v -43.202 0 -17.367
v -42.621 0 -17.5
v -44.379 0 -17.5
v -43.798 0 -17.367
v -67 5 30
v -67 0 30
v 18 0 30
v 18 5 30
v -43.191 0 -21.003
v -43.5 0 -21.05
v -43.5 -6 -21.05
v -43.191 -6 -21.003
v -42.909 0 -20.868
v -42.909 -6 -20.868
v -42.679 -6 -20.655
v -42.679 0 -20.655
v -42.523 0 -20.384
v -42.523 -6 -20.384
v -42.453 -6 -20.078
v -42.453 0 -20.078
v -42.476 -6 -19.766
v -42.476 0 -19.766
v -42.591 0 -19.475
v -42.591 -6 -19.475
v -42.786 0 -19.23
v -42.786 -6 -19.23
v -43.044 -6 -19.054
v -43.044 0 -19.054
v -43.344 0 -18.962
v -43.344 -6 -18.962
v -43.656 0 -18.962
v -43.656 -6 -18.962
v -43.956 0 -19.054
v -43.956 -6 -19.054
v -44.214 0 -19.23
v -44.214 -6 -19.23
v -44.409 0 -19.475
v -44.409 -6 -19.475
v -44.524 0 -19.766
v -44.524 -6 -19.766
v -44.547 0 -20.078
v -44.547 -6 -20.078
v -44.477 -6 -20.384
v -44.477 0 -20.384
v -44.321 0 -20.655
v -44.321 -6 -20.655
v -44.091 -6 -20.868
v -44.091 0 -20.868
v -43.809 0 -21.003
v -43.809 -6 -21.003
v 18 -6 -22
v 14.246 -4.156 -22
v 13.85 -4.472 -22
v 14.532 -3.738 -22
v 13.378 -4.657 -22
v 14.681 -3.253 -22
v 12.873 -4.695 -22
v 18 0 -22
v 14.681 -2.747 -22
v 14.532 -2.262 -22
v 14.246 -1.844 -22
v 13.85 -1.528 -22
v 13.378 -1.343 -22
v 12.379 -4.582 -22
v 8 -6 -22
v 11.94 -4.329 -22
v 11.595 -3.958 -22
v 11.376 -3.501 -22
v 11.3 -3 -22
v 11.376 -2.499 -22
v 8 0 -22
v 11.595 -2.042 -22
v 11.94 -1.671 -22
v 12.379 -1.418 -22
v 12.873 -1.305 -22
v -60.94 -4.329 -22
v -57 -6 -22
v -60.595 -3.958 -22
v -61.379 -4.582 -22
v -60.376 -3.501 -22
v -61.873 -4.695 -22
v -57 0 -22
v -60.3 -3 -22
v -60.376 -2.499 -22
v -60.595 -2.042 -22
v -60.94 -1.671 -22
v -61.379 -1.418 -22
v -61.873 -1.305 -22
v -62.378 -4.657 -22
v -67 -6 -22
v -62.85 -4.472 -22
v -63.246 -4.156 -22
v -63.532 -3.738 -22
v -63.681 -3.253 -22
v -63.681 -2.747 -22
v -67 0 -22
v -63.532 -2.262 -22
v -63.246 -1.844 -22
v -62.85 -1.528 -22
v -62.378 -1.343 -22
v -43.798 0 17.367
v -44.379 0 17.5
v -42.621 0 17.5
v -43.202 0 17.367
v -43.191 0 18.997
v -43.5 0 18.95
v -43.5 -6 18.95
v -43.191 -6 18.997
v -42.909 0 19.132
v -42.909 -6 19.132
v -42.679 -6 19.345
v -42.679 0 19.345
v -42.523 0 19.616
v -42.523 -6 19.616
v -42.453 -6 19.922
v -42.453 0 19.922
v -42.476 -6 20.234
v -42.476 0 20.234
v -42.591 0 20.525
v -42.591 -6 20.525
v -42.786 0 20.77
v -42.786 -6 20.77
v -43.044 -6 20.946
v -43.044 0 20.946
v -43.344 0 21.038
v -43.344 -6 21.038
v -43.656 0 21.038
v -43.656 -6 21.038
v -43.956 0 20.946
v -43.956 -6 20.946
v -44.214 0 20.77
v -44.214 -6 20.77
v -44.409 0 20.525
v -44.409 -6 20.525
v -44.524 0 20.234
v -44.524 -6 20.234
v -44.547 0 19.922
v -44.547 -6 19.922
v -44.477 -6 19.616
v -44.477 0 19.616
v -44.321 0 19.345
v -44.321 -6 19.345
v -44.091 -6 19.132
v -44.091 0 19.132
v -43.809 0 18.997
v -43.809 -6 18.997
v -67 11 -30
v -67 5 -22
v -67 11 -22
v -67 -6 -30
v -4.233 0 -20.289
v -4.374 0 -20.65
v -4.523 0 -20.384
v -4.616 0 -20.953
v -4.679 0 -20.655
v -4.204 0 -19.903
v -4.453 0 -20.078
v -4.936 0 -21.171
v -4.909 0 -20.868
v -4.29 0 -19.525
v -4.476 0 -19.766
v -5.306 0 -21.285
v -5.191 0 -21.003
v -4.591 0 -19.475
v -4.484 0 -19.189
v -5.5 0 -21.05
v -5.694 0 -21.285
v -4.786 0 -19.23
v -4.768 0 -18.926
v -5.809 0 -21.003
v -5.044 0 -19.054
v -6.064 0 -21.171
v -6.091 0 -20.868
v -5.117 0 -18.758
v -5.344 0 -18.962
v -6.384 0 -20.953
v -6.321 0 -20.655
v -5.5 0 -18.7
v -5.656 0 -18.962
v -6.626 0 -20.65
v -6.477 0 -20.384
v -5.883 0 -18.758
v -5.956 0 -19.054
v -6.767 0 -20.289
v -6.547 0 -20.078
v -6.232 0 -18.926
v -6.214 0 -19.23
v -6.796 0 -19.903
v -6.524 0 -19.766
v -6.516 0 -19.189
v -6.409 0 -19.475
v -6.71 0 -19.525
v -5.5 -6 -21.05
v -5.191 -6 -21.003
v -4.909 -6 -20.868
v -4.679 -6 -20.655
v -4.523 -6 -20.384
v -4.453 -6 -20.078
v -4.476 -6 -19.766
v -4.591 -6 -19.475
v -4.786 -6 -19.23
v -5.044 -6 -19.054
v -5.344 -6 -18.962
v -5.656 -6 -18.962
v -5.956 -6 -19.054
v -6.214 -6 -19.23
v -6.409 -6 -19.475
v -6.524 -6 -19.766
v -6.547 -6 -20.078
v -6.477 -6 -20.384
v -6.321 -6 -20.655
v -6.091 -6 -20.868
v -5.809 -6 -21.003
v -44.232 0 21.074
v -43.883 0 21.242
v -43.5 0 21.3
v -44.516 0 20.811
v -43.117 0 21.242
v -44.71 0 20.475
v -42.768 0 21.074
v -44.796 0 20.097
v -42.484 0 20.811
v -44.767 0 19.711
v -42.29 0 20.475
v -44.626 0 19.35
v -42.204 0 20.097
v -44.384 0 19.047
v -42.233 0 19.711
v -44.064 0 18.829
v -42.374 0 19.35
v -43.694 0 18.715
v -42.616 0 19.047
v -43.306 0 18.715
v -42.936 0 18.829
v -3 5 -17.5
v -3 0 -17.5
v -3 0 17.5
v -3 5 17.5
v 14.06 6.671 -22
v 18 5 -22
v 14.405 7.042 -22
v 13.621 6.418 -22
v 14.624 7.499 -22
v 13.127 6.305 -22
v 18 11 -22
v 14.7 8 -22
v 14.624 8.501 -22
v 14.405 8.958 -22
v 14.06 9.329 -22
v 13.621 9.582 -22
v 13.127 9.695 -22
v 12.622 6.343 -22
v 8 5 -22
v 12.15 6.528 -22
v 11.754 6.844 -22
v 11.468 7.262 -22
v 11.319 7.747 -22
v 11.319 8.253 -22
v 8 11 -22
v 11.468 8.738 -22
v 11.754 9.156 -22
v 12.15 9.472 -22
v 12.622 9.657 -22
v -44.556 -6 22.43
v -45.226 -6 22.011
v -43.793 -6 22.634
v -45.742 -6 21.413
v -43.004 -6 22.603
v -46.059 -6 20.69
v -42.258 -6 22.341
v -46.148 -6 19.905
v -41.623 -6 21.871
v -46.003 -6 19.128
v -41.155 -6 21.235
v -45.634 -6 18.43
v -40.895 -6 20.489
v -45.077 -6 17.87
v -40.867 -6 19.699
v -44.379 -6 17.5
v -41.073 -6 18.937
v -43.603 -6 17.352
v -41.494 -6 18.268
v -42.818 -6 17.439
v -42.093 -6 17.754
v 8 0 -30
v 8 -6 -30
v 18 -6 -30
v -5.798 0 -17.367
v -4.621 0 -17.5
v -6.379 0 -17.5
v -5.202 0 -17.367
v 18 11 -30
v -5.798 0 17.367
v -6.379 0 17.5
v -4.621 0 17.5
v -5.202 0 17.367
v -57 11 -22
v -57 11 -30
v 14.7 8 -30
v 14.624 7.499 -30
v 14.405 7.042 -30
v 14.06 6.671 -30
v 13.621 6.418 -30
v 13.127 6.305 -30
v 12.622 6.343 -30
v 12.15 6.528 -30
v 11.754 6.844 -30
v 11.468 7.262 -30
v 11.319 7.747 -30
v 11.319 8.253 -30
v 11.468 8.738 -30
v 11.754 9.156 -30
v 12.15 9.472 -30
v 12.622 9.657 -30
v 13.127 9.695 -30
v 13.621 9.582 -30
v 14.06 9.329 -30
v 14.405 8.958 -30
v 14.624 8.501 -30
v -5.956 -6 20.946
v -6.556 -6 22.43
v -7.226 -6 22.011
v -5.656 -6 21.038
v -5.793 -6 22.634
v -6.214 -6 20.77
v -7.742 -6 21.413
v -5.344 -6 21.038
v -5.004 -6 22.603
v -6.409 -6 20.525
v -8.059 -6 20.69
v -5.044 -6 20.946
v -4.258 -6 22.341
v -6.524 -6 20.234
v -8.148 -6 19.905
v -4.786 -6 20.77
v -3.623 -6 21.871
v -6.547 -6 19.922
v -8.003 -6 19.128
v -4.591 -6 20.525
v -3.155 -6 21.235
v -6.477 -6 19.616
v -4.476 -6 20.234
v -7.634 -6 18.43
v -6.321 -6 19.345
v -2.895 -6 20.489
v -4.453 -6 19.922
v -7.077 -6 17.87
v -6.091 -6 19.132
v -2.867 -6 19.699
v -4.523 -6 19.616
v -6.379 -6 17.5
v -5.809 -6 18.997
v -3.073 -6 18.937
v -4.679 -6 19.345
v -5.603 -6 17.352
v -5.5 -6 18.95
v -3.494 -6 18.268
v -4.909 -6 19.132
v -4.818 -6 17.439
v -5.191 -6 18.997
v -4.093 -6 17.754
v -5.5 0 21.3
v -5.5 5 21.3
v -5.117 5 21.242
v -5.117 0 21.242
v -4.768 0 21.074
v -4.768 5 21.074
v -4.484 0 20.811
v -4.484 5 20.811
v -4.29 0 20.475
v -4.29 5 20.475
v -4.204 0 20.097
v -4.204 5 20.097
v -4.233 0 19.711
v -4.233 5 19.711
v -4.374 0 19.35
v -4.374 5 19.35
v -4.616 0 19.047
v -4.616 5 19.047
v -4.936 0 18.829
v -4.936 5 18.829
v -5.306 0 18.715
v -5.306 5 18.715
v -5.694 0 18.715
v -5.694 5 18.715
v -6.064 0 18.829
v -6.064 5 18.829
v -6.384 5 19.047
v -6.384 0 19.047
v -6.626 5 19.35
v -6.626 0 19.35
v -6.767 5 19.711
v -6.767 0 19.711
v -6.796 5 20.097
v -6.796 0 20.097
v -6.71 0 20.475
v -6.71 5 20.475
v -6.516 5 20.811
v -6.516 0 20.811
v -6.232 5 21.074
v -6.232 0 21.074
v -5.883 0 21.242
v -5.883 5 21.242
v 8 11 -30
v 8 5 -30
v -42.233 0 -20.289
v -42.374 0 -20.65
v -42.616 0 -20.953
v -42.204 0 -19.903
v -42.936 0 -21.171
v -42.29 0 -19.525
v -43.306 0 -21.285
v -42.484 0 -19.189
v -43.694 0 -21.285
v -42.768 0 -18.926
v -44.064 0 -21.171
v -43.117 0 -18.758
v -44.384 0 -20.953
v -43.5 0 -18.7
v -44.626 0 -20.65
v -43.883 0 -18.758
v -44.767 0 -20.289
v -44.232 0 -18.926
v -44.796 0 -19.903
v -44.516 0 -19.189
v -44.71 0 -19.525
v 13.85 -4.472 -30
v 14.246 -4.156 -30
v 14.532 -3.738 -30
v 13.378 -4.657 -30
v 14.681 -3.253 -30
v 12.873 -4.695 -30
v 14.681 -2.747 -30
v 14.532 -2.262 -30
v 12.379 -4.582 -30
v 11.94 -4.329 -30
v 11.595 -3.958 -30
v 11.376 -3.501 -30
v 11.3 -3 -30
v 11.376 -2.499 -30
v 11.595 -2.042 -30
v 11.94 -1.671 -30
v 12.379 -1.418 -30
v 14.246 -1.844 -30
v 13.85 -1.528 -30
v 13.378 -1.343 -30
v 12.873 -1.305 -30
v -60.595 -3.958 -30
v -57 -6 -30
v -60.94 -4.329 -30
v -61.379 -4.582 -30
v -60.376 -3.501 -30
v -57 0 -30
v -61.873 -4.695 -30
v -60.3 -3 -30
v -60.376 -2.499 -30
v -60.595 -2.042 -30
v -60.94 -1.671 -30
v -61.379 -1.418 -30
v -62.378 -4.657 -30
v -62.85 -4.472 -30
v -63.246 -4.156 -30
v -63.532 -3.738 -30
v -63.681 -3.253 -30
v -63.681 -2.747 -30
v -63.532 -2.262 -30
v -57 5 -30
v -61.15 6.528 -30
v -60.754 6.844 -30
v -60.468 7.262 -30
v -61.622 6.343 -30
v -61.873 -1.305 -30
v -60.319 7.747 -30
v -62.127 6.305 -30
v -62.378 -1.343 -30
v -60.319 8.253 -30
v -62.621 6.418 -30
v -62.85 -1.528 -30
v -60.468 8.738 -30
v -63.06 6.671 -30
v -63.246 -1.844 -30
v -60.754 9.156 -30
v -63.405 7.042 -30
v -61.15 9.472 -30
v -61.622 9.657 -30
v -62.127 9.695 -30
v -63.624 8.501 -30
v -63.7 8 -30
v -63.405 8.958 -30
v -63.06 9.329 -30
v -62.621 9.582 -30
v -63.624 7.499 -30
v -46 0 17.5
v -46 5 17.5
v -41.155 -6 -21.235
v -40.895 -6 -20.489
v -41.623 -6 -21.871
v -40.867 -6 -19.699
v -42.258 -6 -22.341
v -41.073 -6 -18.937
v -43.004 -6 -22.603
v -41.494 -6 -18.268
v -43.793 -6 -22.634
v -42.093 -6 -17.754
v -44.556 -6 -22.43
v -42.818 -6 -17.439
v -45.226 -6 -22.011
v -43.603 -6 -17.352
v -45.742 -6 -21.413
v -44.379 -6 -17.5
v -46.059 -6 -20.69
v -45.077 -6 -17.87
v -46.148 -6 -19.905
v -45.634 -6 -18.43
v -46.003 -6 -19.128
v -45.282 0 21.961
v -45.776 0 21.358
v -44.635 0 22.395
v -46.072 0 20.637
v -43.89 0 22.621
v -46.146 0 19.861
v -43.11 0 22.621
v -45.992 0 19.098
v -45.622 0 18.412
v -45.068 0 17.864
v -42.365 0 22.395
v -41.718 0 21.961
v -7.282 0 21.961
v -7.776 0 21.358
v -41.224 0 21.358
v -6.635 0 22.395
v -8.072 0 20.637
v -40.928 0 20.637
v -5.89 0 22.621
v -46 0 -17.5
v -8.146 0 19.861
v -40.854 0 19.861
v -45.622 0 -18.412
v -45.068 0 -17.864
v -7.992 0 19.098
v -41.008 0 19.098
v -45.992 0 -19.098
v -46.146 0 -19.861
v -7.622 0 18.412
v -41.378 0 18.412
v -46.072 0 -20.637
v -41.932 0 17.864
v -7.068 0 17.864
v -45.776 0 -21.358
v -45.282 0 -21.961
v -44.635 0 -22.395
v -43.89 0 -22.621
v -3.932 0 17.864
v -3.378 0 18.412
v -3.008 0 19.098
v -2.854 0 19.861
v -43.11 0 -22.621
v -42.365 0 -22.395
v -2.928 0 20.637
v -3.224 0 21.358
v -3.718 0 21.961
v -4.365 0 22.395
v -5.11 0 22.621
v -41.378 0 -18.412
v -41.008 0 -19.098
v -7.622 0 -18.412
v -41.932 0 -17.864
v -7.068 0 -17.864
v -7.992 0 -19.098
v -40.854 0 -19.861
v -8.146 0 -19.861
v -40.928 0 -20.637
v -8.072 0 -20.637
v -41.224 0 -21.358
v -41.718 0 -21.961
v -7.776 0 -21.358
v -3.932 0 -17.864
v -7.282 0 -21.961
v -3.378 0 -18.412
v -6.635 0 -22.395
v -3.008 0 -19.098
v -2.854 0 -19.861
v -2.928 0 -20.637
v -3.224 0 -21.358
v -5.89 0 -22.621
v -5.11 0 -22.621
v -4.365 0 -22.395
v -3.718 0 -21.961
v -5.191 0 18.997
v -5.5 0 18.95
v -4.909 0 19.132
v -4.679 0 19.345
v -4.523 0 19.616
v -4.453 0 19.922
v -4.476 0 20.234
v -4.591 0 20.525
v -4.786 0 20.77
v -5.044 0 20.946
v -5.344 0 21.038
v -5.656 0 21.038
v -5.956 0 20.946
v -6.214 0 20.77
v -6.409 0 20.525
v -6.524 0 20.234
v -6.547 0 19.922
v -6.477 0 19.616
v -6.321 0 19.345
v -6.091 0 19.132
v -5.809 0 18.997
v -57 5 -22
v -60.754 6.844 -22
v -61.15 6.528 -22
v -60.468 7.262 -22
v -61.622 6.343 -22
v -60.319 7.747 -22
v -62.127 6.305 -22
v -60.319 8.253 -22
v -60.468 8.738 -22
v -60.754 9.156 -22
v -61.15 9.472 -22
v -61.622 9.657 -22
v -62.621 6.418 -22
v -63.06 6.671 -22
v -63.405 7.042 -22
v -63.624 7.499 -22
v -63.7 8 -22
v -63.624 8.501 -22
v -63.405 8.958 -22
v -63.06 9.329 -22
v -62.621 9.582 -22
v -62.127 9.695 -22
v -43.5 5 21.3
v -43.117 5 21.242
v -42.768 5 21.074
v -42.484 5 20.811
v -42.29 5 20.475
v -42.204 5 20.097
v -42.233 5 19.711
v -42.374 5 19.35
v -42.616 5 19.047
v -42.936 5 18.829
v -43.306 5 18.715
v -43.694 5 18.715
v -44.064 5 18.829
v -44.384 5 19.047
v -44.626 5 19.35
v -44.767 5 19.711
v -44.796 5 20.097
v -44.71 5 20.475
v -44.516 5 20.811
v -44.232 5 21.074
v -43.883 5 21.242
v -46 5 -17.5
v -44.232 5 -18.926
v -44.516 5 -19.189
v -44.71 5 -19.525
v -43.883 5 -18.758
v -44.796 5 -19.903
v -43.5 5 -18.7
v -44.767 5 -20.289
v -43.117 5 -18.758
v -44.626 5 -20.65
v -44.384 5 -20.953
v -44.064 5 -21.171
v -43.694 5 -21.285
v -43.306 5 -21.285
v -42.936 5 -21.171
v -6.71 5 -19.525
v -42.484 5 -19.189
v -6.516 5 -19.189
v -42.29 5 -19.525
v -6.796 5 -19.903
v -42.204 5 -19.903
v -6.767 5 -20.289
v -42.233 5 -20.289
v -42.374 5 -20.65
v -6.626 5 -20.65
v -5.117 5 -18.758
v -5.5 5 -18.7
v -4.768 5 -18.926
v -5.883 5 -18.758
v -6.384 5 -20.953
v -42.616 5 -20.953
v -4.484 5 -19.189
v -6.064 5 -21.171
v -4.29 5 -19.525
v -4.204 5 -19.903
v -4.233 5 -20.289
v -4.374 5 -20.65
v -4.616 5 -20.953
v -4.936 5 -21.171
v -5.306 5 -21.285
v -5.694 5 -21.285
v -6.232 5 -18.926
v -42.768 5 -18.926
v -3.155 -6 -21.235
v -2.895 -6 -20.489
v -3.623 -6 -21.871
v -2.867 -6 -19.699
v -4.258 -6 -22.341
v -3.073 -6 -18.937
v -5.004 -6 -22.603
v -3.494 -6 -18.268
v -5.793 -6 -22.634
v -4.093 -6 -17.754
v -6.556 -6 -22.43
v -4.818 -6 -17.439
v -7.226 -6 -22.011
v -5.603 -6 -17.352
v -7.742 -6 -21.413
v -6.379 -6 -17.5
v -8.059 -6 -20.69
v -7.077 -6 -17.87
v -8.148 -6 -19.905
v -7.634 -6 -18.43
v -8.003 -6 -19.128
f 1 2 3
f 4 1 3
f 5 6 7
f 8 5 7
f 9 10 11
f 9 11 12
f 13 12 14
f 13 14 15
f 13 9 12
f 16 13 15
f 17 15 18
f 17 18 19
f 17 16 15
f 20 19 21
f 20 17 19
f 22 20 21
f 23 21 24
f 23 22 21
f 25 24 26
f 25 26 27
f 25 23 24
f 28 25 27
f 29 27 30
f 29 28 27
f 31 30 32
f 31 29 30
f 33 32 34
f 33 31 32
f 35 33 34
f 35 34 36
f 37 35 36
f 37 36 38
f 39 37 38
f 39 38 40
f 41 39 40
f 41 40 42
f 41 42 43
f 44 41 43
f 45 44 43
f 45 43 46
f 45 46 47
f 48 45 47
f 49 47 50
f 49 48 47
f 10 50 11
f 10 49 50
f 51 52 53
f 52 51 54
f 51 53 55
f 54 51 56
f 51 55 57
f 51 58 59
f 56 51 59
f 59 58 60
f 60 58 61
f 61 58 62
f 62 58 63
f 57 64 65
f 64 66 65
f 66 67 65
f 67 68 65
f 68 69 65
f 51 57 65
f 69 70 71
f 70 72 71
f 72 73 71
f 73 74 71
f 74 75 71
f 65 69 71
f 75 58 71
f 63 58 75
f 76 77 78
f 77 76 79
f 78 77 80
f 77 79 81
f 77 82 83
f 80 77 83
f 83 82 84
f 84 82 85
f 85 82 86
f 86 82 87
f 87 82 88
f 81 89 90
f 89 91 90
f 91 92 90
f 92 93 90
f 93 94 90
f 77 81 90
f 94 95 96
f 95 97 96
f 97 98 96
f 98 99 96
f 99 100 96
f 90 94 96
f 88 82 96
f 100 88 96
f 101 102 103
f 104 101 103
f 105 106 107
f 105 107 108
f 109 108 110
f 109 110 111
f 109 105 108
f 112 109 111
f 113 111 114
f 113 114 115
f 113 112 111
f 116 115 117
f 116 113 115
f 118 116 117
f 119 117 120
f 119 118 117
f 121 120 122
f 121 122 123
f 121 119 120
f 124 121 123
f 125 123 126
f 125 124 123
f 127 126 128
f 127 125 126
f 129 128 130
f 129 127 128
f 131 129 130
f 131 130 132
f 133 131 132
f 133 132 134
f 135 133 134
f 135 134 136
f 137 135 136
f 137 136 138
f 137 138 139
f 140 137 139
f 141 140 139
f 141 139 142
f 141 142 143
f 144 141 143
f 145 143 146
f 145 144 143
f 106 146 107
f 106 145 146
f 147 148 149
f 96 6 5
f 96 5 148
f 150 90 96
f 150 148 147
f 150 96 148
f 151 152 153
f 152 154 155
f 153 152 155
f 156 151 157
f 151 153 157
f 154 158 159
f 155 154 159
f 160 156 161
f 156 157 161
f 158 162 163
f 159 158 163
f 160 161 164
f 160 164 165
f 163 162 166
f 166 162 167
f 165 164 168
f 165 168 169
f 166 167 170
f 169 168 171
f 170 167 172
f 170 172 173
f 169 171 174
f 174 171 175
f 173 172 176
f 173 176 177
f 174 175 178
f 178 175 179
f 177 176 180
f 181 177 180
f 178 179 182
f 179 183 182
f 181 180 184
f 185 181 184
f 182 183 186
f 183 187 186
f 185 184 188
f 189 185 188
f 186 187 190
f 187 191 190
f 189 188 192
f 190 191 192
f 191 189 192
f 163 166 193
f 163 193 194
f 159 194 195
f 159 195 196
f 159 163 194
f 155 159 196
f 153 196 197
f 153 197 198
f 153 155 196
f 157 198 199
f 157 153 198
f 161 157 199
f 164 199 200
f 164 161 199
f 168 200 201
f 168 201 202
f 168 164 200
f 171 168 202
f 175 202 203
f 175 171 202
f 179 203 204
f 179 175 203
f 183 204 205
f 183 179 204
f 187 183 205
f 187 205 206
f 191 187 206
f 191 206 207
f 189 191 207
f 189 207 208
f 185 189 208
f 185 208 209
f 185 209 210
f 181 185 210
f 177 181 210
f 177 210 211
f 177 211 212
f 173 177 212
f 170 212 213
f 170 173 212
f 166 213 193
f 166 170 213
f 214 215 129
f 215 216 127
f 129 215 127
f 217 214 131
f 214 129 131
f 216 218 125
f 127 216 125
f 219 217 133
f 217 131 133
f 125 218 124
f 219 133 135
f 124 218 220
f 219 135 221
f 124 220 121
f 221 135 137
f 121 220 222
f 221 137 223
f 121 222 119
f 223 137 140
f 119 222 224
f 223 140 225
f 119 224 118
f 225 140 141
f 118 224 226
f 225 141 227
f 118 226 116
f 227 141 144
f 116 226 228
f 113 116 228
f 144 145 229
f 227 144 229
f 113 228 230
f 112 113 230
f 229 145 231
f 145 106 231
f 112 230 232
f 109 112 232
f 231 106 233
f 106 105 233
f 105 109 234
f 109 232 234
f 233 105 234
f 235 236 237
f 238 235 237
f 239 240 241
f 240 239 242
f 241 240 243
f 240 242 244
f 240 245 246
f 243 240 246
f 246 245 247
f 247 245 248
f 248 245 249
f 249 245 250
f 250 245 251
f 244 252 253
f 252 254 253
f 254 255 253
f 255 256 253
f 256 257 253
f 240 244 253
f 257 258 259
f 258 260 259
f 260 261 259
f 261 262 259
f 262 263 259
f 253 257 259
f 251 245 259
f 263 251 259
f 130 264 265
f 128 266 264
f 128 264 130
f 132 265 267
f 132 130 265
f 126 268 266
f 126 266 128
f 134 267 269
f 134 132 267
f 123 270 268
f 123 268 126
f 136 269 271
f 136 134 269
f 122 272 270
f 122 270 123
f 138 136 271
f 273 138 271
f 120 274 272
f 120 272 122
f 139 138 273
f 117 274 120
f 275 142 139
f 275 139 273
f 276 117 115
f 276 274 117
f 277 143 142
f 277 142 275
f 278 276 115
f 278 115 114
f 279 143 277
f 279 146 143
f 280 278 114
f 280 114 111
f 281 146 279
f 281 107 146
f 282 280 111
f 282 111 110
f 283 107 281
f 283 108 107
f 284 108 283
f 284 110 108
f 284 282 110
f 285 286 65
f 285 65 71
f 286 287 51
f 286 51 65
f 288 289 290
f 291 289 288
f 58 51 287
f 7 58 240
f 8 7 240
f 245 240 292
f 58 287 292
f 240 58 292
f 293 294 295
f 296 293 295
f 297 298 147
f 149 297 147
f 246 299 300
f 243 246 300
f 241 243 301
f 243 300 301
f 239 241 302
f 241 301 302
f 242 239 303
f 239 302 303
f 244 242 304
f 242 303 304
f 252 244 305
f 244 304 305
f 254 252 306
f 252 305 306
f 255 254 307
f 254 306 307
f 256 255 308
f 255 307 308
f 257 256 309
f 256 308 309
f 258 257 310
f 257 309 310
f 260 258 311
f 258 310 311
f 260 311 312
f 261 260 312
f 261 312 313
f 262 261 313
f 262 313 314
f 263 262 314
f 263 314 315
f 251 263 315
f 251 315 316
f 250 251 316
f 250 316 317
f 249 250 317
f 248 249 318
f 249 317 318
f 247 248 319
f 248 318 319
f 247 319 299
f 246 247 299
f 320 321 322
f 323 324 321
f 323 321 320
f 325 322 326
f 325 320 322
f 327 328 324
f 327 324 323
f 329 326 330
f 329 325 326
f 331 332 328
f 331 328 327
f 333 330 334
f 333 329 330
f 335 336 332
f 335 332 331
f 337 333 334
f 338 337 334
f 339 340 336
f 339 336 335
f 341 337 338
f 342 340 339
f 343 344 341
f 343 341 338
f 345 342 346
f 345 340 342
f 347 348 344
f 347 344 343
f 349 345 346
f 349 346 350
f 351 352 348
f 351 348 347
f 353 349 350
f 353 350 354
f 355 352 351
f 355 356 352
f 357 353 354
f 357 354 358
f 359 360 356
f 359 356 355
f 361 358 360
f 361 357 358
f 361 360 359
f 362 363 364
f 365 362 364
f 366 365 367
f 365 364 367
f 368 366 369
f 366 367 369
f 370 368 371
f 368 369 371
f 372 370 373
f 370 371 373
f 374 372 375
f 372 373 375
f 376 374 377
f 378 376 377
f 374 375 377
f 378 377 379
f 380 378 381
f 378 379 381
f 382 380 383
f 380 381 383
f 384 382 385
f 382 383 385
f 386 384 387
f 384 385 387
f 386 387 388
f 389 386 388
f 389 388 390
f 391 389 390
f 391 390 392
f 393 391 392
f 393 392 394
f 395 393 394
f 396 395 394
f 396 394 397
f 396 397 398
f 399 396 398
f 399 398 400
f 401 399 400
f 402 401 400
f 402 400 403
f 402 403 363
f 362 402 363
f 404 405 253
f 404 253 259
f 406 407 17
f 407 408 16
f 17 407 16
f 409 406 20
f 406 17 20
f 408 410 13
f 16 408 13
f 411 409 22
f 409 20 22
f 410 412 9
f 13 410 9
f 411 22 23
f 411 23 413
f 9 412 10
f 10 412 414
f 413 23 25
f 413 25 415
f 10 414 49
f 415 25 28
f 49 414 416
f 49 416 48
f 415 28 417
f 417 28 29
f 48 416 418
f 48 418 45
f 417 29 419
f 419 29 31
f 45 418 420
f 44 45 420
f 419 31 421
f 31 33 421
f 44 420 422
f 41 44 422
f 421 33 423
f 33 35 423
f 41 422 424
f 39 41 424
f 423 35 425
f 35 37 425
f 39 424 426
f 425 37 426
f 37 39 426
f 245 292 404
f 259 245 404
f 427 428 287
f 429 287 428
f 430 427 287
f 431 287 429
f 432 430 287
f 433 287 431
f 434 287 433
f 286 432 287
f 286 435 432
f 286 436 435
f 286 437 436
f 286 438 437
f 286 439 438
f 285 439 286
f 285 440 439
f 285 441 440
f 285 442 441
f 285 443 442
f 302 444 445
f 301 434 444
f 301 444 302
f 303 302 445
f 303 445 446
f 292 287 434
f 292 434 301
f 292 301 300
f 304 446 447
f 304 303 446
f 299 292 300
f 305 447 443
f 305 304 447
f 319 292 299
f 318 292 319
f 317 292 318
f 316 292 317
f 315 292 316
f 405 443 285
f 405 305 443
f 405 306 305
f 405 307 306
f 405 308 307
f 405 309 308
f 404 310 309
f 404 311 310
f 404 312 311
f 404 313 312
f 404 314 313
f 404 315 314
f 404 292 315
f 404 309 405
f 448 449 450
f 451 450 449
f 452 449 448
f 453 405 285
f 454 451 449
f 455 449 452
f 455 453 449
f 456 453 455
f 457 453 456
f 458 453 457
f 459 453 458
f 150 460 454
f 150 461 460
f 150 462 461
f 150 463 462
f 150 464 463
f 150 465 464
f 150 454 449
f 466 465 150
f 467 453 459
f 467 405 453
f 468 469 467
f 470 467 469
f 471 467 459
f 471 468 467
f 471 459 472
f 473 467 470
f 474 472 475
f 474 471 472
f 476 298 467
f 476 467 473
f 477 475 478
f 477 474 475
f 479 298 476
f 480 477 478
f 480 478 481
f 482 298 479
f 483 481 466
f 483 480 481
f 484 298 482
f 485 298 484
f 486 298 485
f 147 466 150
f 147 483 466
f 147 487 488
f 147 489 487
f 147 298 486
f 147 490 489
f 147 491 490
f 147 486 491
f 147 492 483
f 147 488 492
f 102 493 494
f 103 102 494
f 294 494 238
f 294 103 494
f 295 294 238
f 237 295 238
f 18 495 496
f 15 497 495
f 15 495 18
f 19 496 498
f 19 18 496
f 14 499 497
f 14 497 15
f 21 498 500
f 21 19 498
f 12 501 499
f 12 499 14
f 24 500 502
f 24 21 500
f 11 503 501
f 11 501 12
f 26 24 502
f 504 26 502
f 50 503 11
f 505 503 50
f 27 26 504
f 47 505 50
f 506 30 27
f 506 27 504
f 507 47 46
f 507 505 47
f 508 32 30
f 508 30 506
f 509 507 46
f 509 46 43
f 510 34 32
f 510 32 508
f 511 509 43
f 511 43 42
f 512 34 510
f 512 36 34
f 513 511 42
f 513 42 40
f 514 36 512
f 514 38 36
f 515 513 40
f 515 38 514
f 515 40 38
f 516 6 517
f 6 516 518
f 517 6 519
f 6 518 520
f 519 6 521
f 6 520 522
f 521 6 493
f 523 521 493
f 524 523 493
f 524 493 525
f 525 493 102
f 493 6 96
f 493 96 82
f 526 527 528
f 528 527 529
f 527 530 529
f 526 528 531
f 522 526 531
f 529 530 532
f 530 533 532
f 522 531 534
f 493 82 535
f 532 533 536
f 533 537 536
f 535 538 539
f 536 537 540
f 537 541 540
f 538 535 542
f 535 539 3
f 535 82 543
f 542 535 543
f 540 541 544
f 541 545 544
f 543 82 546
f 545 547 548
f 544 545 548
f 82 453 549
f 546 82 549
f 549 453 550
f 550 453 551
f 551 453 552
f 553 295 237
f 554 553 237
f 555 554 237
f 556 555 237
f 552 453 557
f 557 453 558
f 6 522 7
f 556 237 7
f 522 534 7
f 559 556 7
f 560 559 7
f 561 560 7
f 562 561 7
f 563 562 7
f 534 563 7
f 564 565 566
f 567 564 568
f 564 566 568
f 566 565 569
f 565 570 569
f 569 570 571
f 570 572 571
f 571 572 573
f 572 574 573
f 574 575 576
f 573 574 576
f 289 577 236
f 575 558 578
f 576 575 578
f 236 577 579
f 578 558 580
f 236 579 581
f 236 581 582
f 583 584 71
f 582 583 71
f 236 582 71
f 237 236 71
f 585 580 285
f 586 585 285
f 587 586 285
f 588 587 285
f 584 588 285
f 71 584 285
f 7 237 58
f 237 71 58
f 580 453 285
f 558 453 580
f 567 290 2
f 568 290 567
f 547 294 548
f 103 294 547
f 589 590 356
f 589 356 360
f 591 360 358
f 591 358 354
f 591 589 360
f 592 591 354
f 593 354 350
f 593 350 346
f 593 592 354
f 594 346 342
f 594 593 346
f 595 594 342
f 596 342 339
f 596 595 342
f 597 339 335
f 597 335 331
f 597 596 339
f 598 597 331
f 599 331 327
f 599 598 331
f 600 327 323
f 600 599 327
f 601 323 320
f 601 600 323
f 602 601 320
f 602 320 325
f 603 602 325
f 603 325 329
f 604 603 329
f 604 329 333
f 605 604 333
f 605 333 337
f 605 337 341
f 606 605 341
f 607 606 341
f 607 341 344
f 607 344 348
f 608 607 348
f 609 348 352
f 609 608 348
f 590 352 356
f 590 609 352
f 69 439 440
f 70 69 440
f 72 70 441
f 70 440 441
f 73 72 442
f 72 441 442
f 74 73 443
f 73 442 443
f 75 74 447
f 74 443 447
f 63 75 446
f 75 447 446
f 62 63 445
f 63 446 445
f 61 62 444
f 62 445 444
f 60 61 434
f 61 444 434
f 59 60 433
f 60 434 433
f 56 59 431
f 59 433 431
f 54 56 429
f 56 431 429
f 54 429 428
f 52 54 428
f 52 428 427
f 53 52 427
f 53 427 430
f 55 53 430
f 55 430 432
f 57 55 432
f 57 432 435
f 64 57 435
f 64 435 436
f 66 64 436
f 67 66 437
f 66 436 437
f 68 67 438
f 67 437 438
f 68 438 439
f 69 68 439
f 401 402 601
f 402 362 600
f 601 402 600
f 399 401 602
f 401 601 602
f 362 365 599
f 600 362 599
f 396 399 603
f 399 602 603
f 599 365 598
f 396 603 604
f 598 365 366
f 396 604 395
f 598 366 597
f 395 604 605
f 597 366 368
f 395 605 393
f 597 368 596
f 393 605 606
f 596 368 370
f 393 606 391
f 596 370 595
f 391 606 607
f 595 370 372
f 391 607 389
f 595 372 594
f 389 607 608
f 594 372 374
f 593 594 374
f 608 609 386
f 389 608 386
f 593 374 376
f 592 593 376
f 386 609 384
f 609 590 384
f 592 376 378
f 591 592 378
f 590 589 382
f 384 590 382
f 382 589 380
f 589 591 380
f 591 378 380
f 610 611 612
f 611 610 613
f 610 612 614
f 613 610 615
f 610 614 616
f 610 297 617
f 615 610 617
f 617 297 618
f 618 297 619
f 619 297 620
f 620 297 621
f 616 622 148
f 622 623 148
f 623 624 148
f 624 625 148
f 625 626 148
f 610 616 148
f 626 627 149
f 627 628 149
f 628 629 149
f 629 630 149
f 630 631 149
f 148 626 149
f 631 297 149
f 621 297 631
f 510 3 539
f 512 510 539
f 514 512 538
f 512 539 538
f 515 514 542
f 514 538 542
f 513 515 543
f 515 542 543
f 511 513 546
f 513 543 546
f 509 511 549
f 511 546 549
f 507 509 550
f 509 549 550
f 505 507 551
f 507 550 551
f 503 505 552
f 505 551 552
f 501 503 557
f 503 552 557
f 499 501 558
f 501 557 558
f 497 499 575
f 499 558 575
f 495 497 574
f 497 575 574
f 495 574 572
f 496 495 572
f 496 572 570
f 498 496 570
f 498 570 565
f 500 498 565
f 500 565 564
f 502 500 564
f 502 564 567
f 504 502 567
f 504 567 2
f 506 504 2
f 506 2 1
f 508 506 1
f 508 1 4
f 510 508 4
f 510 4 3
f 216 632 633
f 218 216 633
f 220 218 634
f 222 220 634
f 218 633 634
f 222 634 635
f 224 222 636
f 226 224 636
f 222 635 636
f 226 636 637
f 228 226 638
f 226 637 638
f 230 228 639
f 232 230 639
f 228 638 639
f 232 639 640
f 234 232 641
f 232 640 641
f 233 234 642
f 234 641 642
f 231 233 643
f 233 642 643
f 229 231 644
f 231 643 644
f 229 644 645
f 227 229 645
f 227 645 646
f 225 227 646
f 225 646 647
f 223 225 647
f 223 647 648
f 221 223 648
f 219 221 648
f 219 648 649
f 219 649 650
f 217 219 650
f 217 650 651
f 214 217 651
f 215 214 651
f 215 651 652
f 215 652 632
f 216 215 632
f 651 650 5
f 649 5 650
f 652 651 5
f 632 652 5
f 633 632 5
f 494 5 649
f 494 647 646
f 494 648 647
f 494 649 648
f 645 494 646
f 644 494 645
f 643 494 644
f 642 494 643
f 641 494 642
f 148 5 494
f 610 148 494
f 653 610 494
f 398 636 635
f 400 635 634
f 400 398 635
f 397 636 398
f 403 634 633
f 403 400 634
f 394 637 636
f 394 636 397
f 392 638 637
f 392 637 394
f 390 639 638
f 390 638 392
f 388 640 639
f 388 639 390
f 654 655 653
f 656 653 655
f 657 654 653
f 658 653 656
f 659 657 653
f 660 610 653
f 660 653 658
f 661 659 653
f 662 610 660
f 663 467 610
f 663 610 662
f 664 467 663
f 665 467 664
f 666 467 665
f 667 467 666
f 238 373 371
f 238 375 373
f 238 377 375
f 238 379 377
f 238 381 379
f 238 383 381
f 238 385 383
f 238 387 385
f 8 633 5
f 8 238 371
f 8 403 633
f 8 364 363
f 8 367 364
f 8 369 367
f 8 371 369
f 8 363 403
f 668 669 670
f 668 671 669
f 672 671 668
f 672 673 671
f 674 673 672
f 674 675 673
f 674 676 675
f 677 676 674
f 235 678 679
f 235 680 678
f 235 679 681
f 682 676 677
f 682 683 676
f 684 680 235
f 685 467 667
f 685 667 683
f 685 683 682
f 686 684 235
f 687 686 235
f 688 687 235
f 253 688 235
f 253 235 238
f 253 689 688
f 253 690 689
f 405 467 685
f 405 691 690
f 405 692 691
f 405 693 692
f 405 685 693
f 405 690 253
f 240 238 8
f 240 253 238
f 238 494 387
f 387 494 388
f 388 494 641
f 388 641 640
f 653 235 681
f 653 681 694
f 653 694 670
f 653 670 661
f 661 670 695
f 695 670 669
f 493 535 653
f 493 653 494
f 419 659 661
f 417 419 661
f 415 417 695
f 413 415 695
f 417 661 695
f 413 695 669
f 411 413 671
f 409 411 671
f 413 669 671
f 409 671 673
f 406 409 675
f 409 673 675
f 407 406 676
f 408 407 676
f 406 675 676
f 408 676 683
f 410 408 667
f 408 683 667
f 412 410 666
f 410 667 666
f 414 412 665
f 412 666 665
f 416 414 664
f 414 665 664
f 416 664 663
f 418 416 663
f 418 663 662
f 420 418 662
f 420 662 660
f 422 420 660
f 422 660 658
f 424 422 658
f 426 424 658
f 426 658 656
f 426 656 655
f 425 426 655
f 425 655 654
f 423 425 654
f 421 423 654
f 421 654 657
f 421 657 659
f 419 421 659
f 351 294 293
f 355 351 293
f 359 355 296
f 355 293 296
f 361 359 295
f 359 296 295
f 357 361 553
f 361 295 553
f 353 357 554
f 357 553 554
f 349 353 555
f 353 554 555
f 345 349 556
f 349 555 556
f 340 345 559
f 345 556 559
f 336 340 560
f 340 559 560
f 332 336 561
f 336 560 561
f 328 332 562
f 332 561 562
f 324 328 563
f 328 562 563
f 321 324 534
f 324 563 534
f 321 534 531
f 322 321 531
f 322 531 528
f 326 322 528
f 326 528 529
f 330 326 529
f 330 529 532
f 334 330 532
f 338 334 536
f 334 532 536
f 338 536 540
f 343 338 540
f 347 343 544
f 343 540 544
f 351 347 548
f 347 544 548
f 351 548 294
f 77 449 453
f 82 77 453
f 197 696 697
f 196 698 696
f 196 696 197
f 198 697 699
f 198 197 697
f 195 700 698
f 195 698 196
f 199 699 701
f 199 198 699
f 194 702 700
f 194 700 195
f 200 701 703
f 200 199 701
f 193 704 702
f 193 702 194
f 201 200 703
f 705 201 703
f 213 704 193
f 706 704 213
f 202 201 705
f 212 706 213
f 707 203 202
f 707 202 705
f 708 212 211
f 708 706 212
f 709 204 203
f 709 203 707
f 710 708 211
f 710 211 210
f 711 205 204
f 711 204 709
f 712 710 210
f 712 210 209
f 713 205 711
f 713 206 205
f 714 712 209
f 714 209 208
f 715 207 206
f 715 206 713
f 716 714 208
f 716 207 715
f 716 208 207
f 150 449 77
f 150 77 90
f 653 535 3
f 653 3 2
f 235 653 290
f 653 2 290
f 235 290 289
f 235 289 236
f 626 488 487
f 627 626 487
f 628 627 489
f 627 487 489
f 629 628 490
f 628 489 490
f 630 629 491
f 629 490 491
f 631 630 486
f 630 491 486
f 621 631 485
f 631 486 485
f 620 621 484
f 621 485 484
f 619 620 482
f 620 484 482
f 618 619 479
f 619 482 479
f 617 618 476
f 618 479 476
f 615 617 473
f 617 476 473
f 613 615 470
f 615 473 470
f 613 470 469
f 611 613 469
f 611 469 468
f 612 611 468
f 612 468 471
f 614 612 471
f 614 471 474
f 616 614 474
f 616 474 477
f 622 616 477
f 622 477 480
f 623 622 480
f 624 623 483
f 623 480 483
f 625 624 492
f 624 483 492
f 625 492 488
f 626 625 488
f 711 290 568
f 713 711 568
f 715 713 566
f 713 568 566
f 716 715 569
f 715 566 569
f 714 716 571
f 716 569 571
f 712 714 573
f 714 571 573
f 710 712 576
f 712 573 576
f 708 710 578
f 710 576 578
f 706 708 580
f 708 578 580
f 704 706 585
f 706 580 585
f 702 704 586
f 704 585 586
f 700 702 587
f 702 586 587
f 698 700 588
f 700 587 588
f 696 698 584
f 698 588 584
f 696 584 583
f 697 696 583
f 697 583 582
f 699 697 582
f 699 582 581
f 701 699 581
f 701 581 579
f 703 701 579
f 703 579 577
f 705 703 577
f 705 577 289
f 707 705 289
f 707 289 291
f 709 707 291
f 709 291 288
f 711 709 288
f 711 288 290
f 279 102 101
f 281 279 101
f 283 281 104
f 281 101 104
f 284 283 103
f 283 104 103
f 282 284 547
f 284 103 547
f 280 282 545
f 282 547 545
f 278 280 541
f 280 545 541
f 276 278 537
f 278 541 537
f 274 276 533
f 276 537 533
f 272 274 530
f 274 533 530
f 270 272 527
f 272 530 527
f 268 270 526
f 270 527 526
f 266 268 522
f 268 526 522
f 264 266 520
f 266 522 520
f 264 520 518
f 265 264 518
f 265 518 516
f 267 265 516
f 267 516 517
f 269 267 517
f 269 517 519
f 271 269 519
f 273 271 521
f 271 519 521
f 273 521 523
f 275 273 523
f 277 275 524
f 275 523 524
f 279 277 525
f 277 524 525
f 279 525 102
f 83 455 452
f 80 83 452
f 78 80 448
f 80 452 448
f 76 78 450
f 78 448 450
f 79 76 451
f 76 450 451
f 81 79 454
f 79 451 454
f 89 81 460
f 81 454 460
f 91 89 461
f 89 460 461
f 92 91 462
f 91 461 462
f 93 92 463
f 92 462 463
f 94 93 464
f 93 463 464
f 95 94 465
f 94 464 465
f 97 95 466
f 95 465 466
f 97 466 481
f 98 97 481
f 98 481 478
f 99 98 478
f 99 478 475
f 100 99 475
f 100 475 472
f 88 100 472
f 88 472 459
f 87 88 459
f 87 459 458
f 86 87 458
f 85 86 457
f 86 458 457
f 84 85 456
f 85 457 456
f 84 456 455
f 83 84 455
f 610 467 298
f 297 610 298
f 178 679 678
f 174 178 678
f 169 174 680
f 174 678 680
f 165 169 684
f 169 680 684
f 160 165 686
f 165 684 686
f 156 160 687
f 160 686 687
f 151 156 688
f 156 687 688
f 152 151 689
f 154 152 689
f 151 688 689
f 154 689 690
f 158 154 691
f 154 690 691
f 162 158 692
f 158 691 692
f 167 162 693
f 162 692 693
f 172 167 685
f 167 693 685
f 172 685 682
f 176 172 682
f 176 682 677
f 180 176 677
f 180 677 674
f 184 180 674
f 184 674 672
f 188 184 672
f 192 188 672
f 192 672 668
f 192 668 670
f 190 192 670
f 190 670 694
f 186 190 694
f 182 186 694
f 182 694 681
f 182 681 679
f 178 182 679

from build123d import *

# Parameters (mm, degrees)
SKETCH3_W           = 85
SKETCH3_H           = 60
BOSS_EXTRUDE3_DEPTH = 5
SKETCH5_W           = 43
SKETCH5_H           = 35
CUT_EXTRUDE2_DEPTH  = 10
CUT_EXTRUDE1_REACH  = 75.58
SKETCH4_R           = 1.3
SKETCH9_R           = 2.65
SKETCH9_R_2         = 1.05
BOSS_EXTRUDE5_DEPTH = 6
SKETCH10_W          = 10
SKETCH10_H          = 6
SKETCH10_R          = 1.7
BOSS_EXTRUDE6_DEPTH = 8


with BuildPart() as part:
    # Sketch3 → Boss-Extrude3 (new body)
    with BuildSketch(Plane(origin=(0, 0, 0), x_dir=(1, 0, 0), z_dir=(0, 1, 0))):
        with Locations((-24.5, 0)):
            Rectangle(SKETCH3_W, SKETCH3_H)
    extrude(amount=BOSS_EXTRUDE3_DEPTH)

    # Sketch5 → Cut-Extrude2 (cut)
    with BuildSketch(Plane.XZ):
        with Locations((-24.5, 0)):
            Rectangle(SKETCH5_W, SKETCH5_H)
    extrude(amount=-CUT_EXTRUDE2_DEPTH, mode=Mode.SUBTRACT)

    # Sketch4 → Cut-Extrude1 (cut, up to next)
    with BuildSketch(Plane(origin=(0, 5, 0), x_dir=(1, 0, 0), z_dir=(0, 1, 0)), mode=Mode.PRIVATE) as cut_extrude1_sk1:
        with Locations(Location((-43.5, 20, 0), (0, 0, 270))):
            Circle(SKETCH4_R)
    cut_extrude1_tool1 = extrude(cut_extrude1_sk1.sketch, amount=-CUT_EXTRUDE1_REACH, mode=Mode.PRIVATE) & part.part
    # Sketch4 → Cut-Extrude1 (cut, up to next)
    with BuildSketch(Plane(origin=(0, 5, 0), x_dir=(1, 0, 0), z_dir=(0, 1, 0)), mode=Mode.PRIVATE) as cut_extrude1_sk2:
        with Locations(Location((-5.5, 20, 0), (0, 0, 270))):
            Circle(SKETCH4_R)
    cut_extrude1_tool2 = extrude(cut_extrude1_sk2.sketch, amount=-CUT_EXTRUDE1_REACH, mode=Mode.PRIVATE) & part.part
    # Sketch4 → Cut-Extrude1 (cut, up to next)
    with BuildSketch(Plane(origin=(0, 5, 0), x_dir=(1, 0, 0), z_dir=(0, 1, 0)), mode=Mode.PRIVATE) as cut_extrude1_sk3:
        with Locations(Location((-5.5, -20, 0), (0, 0, 270))):
            Circle(SKETCH4_R)
    cut_extrude1_tool3 = extrude(cut_extrude1_sk3.sketch, amount=-CUT_EXTRUDE1_REACH, mode=Mode.PRIVATE) & part.part
    # Sketch4 → Cut-Extrude1 (cut, up to next)
    with BuildSketch(Plane(origin=(0, 5, 0), x_dir=(1, 0, 0), z_dir=(0, 1, 0)), mode=Mode.PRIVATE) as cut_extrude1_sk4:
        with Locations(Location((-43.5, -20, 0), (0, 0, 270))):
            Circle(SKETCH4_R)
    cut_extrude1_tool4 = extrude(cut_extrude1_sk4.sketch, amount=-CUT_EXTRUDE1_REACH, mode=Mode.PRIVATE) & part.part
    add(cut_extrude1_tool1.solids().sort_by_distance((-43.5, 5, -20))[0], mode=Mode.SUBTRACT)
    add(cut_extrude1_tool2.solids().sort_by_distance((-5.5, 5, -20))[0], mode=Mode.SUBTRACT)
    add(cut_extrude1_tool3.solids().sort_by_distance((-5.5, 5, 20))[0], mode=Mode.SUBTRACT)
    add(cut_extrude1_tool4.solids().sort_by_distance((-43.5, 5, 20))[0], mode=Mode.SUBTRACT)

    # Sketch9 → Boss-Extrude5 (add)
    # profile 1 of 4: a face of its own
    with BuildSketch(Plane.XZ):
        with Locations(Location((-43.5, 20, 0), (0, 0, 250.629961754))):
            Circle(SKETCH9_R)
        with Locations(Location((-43.5, 20, 0), (0, 0, 270))):
            Circle(SKETCH9_R_2, mode=Mode.SUBTRACT)
    # profile 2 of 4: a face of its own
    with BuildSketch(Plane.XZ):
        with Locations(Location((-43.5, -20, 0), (0, 0, 109.370038246))):
            Circle(SKETCH9_R)
        with Locations(Location((-43.5, -20, 0), (0, 0, 270))):
            Circle(SKETCH9_R_2, mode=Mode.SUBTRACT)
    # profile 3 of 4: a face of its own
    with BuildSketch(Plane.XZ):
        with Locations(Location((-5.5, 20, 0), (0, 0, 250.629961754))):
            Circle(SKETCH9_R)
        with Locations(Location((-5.5, 20, 0), (0, 0, 270))):
            Circle(SKETCH9_R_2, mode=Mode.SUBTRACT)
    # profile 4 of 4: a face of its own
    with BuildSketch(Plane.XZ):
        with Locations(Location((-5.5, -20, 0), (0, 0, 109.370038246))):
            Circle(SKETCH9_R)
        with Locations(Location((-5.5, -20, 0), (0, 0, 270))):
            Circle(SKETCH9_R_2, mode=Mode.SUBTRACT)
    extrude(amount=BOSS_EXTRUDE5_DEPTH)

    # Sketch10 → Boss-Extrude6 (add)
    # profile 1 of 4: a face of its own
    with BuildSketch(Plane(origin=(-17, 0, -30), x_dir=(-1, 0, 0), z_dir=(0, 0, -1))):
        with Locations((-30, -3)):
            Rectangle(SKETCH10_W, SKETCH10_H)
        with Locations((-30, -3)):
            Circle(SKETCH10_R, mode=Mode.SUBTRACT)
    # profile 2 of 4: a face of its own
    with BuildSketch(Plane(origin=(-17, 0, -30), x_dir=(-1, 0, 0), z_dir=(0, 0, -1))):
        with Locations((45, -3)):
            Rectangle(SKETCH10_W, SKETCH10_H)
        with Locations(Location((45, -3, 0), (0, 0, 180))):
            Circle(SKETCH10_R, mode=Mode.SUBTRACT)
    # profile 3 of 4: a face of its own
    with BuildSketch(Plane(origin=(-17, 0, -30), x_dir=(-1, 0, 0), z_dir=(0, 0, -1))):
        with Locations((45, 8)):
            Rectangle(SKETCH10_W, SKETCH10_H)
        with Locations((45, 8)):
            Circle(SKETCH10_R, mode=Mode.SUBTRACT)
    # profile 4 of 4: a face of its own
    with BuildSketch(Plane(origin=(-17, 0, -30), x_dir=(-1, 0, 0), z_dir=(0, 0, -1))):
        with Locations((-30, 8)):
            Rectangle(SKETCH10_W, SKETCH10_H)
        with Locations(Location((-30, 8, 0), (0, 0, 180))):
            Circle(SKETCH10_R, mode=Mode.SUBTRACT)
    extrude(amount=-BOSS_EXTRUDE6_DEPTH)


solid = part.part
